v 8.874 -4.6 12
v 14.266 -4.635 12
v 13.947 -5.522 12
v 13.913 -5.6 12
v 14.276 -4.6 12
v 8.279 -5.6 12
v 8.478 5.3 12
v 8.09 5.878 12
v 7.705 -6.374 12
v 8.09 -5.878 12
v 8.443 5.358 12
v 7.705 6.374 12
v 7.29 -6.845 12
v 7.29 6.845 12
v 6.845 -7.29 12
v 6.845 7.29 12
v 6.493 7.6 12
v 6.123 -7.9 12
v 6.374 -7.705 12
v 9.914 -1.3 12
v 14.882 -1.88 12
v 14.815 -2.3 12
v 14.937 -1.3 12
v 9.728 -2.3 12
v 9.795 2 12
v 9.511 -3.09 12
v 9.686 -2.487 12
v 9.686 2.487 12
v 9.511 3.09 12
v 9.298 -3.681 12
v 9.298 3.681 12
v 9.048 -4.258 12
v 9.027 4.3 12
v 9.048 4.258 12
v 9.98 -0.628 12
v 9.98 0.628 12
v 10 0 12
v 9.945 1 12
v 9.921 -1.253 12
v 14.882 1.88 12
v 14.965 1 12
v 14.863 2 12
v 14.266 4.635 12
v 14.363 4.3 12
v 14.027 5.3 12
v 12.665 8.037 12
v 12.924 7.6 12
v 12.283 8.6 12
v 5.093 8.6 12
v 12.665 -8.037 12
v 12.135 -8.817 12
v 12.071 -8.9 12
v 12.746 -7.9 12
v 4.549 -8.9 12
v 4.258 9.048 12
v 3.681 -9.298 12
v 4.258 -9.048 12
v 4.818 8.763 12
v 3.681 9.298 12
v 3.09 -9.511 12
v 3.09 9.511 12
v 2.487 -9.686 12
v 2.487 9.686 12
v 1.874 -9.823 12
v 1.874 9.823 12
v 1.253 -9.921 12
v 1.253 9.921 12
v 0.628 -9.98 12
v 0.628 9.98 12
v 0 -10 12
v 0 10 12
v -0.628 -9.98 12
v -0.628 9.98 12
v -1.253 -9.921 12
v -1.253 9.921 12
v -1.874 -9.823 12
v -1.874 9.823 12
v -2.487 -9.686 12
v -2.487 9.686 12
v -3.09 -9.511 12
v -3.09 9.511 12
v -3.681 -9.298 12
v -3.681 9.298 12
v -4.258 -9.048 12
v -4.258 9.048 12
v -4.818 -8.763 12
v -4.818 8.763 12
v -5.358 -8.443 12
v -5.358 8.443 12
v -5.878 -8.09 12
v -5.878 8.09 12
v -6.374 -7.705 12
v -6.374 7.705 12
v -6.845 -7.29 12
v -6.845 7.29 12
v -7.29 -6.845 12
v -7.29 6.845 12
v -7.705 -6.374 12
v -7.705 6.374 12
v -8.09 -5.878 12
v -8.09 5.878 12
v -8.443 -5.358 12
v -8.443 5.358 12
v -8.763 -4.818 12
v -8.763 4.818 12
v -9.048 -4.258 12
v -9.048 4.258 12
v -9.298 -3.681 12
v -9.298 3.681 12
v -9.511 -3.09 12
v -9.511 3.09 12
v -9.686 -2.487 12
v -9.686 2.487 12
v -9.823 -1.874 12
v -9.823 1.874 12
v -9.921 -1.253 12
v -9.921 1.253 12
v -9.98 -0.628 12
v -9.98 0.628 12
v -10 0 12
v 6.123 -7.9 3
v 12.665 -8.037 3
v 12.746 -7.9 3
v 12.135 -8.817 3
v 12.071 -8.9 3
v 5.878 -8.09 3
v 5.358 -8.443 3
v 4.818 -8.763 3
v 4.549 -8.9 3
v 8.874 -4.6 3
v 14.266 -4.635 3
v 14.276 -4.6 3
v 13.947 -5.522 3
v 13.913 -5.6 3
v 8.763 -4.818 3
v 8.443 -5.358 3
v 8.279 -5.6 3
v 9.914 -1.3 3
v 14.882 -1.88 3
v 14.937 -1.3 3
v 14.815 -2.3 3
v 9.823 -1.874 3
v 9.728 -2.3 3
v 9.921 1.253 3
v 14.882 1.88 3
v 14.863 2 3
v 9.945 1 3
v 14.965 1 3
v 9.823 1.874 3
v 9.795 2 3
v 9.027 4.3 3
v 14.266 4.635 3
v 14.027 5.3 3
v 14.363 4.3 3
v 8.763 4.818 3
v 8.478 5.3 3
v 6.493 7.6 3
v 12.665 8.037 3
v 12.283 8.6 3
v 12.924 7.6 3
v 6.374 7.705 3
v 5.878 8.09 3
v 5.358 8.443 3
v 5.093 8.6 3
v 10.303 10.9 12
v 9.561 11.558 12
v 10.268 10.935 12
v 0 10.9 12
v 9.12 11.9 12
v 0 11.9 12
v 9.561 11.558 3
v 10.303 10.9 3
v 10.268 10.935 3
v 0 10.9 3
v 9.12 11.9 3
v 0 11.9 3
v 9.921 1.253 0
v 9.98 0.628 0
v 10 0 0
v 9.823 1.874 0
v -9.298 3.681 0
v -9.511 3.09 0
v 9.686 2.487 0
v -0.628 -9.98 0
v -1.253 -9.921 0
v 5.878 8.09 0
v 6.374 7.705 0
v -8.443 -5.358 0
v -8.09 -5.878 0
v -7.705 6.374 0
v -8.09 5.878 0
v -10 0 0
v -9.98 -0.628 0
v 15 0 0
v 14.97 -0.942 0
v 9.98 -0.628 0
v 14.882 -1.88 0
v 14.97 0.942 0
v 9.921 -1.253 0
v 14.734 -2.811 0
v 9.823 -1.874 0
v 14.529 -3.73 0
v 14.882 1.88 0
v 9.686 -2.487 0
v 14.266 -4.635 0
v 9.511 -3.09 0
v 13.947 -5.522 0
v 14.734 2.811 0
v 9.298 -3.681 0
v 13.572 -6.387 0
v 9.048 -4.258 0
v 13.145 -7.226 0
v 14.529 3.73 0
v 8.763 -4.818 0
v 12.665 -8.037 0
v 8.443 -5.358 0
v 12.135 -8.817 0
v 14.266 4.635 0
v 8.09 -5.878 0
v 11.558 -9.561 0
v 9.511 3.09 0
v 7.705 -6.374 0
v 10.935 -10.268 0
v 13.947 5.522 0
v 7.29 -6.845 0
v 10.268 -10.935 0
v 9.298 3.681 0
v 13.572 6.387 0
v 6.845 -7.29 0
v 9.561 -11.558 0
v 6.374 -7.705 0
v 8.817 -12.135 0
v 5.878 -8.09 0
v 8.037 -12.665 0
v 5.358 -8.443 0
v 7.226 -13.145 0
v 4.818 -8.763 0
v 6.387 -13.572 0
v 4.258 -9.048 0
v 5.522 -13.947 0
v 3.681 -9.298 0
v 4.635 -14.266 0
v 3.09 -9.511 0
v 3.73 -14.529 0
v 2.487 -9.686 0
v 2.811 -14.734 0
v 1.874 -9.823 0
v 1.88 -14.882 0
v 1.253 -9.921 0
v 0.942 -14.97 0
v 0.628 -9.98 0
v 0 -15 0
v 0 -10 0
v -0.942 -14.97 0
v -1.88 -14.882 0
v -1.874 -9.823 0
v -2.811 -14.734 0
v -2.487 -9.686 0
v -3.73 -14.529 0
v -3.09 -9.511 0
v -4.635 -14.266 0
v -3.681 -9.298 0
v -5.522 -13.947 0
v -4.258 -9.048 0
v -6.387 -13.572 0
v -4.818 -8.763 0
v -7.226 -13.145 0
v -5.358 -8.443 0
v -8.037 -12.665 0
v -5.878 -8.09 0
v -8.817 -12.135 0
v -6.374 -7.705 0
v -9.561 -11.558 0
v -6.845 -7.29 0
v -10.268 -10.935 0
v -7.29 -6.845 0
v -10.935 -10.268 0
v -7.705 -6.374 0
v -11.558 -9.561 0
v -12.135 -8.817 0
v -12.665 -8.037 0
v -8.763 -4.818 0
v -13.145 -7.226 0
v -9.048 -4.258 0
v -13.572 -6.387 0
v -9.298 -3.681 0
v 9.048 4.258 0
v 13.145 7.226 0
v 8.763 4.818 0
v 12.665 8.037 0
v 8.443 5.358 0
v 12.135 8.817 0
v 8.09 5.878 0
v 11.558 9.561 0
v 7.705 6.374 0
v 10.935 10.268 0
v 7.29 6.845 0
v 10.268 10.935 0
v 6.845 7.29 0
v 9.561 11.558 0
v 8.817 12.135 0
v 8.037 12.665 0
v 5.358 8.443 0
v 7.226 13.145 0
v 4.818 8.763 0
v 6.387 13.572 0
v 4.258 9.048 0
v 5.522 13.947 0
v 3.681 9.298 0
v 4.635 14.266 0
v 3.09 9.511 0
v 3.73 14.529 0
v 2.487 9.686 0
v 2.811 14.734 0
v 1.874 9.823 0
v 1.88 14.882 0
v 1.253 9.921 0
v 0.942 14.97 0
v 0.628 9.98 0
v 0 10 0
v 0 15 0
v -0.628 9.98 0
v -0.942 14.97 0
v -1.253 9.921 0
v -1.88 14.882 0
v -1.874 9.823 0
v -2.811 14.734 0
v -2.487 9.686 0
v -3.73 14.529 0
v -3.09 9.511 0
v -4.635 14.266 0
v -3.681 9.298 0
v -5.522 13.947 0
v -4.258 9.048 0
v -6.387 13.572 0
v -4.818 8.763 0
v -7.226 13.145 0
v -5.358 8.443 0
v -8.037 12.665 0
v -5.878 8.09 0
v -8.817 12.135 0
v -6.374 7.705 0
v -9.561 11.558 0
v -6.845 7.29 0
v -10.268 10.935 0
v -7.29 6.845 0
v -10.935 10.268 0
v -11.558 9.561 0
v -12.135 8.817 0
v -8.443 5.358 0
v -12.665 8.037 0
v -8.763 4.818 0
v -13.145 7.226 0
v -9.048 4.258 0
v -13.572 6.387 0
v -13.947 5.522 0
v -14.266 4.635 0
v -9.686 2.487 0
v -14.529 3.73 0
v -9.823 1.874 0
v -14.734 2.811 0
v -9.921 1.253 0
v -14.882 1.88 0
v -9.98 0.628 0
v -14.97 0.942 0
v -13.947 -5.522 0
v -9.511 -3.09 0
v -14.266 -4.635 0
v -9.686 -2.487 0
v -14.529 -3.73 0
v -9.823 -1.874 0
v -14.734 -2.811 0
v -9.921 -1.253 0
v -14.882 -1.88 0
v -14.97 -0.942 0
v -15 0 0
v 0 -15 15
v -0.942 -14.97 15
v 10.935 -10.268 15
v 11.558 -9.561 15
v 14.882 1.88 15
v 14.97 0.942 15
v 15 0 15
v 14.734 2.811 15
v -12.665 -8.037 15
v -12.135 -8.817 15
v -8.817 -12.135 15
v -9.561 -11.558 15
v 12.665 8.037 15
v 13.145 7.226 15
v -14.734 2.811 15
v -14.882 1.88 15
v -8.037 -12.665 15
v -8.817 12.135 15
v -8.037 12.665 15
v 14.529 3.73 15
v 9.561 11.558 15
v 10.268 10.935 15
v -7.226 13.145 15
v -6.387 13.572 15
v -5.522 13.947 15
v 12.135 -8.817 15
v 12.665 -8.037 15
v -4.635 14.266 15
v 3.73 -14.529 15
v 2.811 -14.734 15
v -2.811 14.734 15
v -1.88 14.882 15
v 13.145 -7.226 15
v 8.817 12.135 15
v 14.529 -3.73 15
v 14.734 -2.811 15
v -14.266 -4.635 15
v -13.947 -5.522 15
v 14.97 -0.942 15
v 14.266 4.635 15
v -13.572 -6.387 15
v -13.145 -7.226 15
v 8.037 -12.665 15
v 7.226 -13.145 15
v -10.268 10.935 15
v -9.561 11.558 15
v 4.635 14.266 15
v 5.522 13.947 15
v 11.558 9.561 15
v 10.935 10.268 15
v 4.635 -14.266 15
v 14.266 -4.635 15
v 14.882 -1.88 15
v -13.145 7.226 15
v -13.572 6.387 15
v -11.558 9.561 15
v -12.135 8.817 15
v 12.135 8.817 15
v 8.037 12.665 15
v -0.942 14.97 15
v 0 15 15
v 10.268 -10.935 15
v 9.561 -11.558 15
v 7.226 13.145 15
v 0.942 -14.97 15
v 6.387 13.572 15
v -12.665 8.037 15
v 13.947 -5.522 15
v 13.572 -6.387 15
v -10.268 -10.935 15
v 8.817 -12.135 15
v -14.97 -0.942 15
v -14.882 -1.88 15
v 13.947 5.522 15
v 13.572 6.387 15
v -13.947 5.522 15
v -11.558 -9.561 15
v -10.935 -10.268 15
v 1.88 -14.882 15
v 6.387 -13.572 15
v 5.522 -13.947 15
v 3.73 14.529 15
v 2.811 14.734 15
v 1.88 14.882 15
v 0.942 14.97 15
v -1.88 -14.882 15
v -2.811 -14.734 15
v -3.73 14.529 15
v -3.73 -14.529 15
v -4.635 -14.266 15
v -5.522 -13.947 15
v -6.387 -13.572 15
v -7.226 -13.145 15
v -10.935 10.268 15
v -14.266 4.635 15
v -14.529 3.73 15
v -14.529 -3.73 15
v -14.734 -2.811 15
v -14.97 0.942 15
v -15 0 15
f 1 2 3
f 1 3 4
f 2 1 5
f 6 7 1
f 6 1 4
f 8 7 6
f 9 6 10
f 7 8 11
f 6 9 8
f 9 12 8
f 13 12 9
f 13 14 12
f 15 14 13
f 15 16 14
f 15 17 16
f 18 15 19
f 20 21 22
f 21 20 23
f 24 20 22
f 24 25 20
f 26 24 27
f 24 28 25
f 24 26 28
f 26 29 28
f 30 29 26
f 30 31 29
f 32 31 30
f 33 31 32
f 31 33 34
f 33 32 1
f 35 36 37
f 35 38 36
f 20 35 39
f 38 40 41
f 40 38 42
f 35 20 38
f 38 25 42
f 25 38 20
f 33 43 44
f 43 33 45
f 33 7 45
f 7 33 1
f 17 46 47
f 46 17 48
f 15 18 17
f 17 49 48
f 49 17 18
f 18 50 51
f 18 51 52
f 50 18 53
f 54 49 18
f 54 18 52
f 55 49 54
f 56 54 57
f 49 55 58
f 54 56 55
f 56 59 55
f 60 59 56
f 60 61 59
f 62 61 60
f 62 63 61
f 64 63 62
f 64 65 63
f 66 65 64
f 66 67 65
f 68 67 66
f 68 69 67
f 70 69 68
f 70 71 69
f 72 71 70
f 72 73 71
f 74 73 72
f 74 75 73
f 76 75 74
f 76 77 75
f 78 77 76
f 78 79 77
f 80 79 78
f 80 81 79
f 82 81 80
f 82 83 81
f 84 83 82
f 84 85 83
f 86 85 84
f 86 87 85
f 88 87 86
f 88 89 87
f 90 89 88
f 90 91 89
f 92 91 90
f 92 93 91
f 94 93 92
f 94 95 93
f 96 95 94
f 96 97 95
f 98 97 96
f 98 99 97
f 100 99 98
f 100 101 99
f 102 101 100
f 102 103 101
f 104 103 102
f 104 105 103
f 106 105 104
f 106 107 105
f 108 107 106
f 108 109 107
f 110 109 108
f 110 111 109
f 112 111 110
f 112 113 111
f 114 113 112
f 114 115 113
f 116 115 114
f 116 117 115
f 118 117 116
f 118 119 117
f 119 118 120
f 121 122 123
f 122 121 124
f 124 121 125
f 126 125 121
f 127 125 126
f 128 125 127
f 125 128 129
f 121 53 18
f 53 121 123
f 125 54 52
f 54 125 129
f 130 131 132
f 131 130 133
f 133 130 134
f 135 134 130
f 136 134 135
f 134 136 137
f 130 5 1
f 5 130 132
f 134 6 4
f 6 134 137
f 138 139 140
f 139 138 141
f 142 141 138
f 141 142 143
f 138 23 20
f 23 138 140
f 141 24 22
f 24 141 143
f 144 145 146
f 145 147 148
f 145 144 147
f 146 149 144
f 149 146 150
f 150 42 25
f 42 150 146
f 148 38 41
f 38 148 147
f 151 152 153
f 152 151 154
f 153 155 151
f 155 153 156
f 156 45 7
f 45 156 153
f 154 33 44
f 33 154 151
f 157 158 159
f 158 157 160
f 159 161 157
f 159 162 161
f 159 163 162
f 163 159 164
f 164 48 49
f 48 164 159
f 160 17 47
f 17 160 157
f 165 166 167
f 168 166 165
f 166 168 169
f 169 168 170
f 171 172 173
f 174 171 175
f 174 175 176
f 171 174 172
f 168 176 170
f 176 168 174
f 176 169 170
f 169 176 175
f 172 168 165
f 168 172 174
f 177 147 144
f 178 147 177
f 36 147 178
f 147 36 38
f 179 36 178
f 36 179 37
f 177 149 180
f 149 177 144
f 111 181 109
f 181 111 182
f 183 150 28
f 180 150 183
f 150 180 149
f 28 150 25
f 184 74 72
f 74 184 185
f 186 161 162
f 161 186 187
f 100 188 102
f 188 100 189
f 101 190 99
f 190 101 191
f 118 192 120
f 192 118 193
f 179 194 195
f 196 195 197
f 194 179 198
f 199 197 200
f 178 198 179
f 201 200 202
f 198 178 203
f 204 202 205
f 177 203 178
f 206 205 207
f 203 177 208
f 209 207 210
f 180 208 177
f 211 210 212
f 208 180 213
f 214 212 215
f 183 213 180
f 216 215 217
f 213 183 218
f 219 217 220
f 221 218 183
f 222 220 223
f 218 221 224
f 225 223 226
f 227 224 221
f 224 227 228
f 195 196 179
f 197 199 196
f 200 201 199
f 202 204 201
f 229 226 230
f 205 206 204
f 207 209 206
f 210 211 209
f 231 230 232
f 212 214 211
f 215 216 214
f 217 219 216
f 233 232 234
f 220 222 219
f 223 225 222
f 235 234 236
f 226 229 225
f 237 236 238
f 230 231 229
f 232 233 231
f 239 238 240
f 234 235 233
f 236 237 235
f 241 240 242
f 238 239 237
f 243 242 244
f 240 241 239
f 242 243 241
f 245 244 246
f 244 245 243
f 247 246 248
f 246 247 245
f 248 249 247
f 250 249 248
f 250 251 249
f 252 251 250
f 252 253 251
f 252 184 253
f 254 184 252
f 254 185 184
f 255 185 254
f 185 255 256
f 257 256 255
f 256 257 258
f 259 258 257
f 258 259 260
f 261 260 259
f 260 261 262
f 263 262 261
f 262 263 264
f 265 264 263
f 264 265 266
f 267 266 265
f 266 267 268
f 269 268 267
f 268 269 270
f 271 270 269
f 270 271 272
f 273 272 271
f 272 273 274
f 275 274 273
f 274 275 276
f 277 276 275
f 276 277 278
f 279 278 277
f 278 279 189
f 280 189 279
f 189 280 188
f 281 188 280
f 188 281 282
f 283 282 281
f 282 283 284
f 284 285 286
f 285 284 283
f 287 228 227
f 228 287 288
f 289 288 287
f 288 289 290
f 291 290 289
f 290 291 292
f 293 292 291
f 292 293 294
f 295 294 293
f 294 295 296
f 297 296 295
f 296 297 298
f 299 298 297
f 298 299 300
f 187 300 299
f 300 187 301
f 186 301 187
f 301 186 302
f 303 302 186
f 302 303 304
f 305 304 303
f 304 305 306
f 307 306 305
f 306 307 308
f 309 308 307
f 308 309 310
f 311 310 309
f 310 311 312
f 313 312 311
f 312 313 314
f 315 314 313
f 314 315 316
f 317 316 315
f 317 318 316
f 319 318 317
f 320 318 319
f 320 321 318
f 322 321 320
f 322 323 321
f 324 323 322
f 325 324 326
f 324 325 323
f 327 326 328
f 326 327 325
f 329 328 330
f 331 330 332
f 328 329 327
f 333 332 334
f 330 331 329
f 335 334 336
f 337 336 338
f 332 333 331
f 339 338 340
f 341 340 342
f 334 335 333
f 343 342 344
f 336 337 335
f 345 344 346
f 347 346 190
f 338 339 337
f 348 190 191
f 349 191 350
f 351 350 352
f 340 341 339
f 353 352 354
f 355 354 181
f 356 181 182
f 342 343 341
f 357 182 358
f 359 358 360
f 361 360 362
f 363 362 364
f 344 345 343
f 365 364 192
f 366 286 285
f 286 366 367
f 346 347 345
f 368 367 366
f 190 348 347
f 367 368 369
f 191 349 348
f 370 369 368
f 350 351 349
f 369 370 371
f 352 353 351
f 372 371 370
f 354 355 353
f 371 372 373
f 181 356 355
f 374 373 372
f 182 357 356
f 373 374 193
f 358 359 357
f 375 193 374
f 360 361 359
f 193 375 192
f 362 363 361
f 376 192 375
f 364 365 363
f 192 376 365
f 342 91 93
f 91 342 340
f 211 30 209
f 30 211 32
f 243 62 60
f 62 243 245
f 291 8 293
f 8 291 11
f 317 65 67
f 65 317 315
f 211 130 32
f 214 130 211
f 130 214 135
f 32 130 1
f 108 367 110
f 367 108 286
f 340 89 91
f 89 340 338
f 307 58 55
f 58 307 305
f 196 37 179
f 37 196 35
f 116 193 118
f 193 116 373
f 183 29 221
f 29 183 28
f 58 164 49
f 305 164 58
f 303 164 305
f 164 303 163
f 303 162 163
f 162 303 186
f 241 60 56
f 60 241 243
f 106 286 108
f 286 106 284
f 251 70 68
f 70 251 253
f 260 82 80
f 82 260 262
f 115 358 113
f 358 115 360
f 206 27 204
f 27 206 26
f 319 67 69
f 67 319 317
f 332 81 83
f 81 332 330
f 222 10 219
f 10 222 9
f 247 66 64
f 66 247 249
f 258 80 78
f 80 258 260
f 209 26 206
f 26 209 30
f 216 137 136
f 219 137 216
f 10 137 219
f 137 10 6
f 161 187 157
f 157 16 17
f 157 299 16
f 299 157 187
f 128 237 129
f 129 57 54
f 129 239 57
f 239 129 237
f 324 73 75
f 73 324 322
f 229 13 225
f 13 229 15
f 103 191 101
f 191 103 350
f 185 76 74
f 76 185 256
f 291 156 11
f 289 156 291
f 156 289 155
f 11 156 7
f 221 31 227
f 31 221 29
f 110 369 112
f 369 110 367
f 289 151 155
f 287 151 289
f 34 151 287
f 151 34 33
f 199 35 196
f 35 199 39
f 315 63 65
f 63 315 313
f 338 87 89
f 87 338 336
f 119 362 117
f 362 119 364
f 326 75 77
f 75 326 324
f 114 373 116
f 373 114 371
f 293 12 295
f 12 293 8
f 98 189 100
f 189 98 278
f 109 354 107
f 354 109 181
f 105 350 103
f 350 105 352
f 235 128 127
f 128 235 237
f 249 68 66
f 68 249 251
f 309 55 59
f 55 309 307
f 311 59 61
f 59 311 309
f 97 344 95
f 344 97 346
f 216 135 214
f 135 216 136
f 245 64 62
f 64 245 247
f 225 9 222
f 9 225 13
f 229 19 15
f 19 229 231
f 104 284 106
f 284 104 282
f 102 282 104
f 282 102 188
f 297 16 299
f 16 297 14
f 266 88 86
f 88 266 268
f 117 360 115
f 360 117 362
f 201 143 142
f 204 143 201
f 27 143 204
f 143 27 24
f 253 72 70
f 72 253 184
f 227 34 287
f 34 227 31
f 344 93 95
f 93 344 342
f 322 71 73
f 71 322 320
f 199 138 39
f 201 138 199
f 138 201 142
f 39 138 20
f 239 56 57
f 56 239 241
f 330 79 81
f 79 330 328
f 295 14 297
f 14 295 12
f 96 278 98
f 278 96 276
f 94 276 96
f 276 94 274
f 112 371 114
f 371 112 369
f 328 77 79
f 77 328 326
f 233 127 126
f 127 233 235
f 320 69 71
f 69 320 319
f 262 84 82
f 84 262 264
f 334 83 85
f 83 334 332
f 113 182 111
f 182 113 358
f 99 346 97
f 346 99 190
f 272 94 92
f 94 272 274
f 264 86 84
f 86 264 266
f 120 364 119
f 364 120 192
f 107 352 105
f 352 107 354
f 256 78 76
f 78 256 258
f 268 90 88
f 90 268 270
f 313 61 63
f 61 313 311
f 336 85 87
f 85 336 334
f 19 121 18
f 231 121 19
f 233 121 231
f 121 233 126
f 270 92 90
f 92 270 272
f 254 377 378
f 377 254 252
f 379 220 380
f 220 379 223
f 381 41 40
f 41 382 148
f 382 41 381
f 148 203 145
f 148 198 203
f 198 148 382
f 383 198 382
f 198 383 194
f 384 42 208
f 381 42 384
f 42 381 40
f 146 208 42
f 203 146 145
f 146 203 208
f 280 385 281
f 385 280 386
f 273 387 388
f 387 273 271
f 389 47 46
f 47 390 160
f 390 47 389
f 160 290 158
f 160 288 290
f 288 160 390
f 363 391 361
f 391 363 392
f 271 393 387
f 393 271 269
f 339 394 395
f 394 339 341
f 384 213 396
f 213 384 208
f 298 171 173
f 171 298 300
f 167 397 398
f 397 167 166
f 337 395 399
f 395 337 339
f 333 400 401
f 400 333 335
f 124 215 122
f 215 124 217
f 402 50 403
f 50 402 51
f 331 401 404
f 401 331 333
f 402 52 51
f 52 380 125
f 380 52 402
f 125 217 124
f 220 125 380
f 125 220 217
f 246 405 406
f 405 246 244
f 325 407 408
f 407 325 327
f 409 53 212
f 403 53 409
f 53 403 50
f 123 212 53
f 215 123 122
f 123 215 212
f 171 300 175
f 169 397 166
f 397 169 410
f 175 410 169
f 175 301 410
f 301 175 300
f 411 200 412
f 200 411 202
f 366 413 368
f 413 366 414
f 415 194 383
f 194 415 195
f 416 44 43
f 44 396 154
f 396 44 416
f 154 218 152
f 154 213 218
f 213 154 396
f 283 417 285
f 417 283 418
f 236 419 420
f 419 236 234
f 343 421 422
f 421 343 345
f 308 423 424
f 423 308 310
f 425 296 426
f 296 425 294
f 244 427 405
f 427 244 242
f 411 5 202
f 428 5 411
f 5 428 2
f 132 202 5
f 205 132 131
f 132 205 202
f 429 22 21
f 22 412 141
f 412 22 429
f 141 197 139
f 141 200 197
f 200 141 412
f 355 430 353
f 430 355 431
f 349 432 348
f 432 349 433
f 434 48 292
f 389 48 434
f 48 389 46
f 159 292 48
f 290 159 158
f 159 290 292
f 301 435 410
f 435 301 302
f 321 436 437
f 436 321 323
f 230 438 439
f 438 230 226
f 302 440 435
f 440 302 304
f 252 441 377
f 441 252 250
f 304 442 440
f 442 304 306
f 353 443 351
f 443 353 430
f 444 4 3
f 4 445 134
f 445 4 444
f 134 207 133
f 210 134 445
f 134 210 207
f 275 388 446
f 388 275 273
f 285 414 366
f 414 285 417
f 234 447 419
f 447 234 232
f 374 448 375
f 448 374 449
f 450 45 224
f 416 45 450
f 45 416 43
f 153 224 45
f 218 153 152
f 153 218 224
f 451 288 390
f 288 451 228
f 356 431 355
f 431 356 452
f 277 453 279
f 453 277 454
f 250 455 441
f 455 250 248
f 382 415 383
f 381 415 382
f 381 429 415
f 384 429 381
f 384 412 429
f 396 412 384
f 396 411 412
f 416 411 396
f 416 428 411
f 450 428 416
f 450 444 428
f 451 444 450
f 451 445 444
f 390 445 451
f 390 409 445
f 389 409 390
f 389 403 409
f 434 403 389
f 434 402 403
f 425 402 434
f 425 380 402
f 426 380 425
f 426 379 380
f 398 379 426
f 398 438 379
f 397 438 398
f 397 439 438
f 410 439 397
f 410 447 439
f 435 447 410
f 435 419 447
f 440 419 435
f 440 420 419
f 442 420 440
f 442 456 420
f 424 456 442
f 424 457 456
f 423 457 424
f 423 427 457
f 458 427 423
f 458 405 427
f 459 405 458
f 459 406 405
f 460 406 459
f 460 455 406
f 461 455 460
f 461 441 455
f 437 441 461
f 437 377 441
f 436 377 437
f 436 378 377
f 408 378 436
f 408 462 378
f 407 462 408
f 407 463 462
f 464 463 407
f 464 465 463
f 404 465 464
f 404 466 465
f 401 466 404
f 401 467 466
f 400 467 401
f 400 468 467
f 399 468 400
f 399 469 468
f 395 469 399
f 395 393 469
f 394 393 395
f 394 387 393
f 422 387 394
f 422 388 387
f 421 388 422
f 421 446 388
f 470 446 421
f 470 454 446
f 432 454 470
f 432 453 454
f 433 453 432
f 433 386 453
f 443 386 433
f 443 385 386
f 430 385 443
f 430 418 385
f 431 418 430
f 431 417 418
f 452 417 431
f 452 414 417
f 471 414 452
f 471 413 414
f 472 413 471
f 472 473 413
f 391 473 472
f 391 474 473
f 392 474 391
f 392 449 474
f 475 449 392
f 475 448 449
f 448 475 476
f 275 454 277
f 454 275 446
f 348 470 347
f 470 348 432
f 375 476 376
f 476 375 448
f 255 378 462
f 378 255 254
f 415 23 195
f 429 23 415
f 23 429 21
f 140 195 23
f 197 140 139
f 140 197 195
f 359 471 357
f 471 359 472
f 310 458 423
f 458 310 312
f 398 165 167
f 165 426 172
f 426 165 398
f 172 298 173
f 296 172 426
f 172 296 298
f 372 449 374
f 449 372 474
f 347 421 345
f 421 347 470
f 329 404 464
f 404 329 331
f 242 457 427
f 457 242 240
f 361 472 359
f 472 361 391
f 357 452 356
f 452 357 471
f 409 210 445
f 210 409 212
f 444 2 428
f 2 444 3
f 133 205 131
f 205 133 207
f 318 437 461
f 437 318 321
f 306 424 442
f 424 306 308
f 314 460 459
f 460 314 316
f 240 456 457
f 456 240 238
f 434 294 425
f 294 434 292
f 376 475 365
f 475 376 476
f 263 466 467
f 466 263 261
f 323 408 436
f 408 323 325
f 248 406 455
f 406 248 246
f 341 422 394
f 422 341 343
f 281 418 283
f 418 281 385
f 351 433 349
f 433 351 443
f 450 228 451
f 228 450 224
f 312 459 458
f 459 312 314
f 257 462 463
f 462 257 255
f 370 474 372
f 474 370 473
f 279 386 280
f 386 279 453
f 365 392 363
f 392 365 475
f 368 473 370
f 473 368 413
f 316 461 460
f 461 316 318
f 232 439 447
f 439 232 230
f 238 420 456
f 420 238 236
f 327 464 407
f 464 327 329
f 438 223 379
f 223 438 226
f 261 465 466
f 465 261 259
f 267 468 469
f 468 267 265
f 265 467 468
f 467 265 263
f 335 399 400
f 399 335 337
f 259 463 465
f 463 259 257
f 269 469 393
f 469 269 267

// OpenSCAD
spacing=33/10;
start_offset = -8.9;
hole_count=6;
end_offset=start_offset + spacing * hole_count;

render(convexity = 4) {
  difference() {
    union() {
      cylinder(h = 15, d=30, $fn=100);
      //for (f = [-9.5 : spacing : 8.5]) {
      //  translate([10,f,0])
      //    cube([15, 1.6, 15]);
      //}
    }
    union () {
      for (f = [start_offset : spacing : end_offset]) {
        translate([0,f,3])
          cube([30, 1, 9]);
      }
      cylinder(h = 12, d=20, $fn=100);
    }
  }
}
